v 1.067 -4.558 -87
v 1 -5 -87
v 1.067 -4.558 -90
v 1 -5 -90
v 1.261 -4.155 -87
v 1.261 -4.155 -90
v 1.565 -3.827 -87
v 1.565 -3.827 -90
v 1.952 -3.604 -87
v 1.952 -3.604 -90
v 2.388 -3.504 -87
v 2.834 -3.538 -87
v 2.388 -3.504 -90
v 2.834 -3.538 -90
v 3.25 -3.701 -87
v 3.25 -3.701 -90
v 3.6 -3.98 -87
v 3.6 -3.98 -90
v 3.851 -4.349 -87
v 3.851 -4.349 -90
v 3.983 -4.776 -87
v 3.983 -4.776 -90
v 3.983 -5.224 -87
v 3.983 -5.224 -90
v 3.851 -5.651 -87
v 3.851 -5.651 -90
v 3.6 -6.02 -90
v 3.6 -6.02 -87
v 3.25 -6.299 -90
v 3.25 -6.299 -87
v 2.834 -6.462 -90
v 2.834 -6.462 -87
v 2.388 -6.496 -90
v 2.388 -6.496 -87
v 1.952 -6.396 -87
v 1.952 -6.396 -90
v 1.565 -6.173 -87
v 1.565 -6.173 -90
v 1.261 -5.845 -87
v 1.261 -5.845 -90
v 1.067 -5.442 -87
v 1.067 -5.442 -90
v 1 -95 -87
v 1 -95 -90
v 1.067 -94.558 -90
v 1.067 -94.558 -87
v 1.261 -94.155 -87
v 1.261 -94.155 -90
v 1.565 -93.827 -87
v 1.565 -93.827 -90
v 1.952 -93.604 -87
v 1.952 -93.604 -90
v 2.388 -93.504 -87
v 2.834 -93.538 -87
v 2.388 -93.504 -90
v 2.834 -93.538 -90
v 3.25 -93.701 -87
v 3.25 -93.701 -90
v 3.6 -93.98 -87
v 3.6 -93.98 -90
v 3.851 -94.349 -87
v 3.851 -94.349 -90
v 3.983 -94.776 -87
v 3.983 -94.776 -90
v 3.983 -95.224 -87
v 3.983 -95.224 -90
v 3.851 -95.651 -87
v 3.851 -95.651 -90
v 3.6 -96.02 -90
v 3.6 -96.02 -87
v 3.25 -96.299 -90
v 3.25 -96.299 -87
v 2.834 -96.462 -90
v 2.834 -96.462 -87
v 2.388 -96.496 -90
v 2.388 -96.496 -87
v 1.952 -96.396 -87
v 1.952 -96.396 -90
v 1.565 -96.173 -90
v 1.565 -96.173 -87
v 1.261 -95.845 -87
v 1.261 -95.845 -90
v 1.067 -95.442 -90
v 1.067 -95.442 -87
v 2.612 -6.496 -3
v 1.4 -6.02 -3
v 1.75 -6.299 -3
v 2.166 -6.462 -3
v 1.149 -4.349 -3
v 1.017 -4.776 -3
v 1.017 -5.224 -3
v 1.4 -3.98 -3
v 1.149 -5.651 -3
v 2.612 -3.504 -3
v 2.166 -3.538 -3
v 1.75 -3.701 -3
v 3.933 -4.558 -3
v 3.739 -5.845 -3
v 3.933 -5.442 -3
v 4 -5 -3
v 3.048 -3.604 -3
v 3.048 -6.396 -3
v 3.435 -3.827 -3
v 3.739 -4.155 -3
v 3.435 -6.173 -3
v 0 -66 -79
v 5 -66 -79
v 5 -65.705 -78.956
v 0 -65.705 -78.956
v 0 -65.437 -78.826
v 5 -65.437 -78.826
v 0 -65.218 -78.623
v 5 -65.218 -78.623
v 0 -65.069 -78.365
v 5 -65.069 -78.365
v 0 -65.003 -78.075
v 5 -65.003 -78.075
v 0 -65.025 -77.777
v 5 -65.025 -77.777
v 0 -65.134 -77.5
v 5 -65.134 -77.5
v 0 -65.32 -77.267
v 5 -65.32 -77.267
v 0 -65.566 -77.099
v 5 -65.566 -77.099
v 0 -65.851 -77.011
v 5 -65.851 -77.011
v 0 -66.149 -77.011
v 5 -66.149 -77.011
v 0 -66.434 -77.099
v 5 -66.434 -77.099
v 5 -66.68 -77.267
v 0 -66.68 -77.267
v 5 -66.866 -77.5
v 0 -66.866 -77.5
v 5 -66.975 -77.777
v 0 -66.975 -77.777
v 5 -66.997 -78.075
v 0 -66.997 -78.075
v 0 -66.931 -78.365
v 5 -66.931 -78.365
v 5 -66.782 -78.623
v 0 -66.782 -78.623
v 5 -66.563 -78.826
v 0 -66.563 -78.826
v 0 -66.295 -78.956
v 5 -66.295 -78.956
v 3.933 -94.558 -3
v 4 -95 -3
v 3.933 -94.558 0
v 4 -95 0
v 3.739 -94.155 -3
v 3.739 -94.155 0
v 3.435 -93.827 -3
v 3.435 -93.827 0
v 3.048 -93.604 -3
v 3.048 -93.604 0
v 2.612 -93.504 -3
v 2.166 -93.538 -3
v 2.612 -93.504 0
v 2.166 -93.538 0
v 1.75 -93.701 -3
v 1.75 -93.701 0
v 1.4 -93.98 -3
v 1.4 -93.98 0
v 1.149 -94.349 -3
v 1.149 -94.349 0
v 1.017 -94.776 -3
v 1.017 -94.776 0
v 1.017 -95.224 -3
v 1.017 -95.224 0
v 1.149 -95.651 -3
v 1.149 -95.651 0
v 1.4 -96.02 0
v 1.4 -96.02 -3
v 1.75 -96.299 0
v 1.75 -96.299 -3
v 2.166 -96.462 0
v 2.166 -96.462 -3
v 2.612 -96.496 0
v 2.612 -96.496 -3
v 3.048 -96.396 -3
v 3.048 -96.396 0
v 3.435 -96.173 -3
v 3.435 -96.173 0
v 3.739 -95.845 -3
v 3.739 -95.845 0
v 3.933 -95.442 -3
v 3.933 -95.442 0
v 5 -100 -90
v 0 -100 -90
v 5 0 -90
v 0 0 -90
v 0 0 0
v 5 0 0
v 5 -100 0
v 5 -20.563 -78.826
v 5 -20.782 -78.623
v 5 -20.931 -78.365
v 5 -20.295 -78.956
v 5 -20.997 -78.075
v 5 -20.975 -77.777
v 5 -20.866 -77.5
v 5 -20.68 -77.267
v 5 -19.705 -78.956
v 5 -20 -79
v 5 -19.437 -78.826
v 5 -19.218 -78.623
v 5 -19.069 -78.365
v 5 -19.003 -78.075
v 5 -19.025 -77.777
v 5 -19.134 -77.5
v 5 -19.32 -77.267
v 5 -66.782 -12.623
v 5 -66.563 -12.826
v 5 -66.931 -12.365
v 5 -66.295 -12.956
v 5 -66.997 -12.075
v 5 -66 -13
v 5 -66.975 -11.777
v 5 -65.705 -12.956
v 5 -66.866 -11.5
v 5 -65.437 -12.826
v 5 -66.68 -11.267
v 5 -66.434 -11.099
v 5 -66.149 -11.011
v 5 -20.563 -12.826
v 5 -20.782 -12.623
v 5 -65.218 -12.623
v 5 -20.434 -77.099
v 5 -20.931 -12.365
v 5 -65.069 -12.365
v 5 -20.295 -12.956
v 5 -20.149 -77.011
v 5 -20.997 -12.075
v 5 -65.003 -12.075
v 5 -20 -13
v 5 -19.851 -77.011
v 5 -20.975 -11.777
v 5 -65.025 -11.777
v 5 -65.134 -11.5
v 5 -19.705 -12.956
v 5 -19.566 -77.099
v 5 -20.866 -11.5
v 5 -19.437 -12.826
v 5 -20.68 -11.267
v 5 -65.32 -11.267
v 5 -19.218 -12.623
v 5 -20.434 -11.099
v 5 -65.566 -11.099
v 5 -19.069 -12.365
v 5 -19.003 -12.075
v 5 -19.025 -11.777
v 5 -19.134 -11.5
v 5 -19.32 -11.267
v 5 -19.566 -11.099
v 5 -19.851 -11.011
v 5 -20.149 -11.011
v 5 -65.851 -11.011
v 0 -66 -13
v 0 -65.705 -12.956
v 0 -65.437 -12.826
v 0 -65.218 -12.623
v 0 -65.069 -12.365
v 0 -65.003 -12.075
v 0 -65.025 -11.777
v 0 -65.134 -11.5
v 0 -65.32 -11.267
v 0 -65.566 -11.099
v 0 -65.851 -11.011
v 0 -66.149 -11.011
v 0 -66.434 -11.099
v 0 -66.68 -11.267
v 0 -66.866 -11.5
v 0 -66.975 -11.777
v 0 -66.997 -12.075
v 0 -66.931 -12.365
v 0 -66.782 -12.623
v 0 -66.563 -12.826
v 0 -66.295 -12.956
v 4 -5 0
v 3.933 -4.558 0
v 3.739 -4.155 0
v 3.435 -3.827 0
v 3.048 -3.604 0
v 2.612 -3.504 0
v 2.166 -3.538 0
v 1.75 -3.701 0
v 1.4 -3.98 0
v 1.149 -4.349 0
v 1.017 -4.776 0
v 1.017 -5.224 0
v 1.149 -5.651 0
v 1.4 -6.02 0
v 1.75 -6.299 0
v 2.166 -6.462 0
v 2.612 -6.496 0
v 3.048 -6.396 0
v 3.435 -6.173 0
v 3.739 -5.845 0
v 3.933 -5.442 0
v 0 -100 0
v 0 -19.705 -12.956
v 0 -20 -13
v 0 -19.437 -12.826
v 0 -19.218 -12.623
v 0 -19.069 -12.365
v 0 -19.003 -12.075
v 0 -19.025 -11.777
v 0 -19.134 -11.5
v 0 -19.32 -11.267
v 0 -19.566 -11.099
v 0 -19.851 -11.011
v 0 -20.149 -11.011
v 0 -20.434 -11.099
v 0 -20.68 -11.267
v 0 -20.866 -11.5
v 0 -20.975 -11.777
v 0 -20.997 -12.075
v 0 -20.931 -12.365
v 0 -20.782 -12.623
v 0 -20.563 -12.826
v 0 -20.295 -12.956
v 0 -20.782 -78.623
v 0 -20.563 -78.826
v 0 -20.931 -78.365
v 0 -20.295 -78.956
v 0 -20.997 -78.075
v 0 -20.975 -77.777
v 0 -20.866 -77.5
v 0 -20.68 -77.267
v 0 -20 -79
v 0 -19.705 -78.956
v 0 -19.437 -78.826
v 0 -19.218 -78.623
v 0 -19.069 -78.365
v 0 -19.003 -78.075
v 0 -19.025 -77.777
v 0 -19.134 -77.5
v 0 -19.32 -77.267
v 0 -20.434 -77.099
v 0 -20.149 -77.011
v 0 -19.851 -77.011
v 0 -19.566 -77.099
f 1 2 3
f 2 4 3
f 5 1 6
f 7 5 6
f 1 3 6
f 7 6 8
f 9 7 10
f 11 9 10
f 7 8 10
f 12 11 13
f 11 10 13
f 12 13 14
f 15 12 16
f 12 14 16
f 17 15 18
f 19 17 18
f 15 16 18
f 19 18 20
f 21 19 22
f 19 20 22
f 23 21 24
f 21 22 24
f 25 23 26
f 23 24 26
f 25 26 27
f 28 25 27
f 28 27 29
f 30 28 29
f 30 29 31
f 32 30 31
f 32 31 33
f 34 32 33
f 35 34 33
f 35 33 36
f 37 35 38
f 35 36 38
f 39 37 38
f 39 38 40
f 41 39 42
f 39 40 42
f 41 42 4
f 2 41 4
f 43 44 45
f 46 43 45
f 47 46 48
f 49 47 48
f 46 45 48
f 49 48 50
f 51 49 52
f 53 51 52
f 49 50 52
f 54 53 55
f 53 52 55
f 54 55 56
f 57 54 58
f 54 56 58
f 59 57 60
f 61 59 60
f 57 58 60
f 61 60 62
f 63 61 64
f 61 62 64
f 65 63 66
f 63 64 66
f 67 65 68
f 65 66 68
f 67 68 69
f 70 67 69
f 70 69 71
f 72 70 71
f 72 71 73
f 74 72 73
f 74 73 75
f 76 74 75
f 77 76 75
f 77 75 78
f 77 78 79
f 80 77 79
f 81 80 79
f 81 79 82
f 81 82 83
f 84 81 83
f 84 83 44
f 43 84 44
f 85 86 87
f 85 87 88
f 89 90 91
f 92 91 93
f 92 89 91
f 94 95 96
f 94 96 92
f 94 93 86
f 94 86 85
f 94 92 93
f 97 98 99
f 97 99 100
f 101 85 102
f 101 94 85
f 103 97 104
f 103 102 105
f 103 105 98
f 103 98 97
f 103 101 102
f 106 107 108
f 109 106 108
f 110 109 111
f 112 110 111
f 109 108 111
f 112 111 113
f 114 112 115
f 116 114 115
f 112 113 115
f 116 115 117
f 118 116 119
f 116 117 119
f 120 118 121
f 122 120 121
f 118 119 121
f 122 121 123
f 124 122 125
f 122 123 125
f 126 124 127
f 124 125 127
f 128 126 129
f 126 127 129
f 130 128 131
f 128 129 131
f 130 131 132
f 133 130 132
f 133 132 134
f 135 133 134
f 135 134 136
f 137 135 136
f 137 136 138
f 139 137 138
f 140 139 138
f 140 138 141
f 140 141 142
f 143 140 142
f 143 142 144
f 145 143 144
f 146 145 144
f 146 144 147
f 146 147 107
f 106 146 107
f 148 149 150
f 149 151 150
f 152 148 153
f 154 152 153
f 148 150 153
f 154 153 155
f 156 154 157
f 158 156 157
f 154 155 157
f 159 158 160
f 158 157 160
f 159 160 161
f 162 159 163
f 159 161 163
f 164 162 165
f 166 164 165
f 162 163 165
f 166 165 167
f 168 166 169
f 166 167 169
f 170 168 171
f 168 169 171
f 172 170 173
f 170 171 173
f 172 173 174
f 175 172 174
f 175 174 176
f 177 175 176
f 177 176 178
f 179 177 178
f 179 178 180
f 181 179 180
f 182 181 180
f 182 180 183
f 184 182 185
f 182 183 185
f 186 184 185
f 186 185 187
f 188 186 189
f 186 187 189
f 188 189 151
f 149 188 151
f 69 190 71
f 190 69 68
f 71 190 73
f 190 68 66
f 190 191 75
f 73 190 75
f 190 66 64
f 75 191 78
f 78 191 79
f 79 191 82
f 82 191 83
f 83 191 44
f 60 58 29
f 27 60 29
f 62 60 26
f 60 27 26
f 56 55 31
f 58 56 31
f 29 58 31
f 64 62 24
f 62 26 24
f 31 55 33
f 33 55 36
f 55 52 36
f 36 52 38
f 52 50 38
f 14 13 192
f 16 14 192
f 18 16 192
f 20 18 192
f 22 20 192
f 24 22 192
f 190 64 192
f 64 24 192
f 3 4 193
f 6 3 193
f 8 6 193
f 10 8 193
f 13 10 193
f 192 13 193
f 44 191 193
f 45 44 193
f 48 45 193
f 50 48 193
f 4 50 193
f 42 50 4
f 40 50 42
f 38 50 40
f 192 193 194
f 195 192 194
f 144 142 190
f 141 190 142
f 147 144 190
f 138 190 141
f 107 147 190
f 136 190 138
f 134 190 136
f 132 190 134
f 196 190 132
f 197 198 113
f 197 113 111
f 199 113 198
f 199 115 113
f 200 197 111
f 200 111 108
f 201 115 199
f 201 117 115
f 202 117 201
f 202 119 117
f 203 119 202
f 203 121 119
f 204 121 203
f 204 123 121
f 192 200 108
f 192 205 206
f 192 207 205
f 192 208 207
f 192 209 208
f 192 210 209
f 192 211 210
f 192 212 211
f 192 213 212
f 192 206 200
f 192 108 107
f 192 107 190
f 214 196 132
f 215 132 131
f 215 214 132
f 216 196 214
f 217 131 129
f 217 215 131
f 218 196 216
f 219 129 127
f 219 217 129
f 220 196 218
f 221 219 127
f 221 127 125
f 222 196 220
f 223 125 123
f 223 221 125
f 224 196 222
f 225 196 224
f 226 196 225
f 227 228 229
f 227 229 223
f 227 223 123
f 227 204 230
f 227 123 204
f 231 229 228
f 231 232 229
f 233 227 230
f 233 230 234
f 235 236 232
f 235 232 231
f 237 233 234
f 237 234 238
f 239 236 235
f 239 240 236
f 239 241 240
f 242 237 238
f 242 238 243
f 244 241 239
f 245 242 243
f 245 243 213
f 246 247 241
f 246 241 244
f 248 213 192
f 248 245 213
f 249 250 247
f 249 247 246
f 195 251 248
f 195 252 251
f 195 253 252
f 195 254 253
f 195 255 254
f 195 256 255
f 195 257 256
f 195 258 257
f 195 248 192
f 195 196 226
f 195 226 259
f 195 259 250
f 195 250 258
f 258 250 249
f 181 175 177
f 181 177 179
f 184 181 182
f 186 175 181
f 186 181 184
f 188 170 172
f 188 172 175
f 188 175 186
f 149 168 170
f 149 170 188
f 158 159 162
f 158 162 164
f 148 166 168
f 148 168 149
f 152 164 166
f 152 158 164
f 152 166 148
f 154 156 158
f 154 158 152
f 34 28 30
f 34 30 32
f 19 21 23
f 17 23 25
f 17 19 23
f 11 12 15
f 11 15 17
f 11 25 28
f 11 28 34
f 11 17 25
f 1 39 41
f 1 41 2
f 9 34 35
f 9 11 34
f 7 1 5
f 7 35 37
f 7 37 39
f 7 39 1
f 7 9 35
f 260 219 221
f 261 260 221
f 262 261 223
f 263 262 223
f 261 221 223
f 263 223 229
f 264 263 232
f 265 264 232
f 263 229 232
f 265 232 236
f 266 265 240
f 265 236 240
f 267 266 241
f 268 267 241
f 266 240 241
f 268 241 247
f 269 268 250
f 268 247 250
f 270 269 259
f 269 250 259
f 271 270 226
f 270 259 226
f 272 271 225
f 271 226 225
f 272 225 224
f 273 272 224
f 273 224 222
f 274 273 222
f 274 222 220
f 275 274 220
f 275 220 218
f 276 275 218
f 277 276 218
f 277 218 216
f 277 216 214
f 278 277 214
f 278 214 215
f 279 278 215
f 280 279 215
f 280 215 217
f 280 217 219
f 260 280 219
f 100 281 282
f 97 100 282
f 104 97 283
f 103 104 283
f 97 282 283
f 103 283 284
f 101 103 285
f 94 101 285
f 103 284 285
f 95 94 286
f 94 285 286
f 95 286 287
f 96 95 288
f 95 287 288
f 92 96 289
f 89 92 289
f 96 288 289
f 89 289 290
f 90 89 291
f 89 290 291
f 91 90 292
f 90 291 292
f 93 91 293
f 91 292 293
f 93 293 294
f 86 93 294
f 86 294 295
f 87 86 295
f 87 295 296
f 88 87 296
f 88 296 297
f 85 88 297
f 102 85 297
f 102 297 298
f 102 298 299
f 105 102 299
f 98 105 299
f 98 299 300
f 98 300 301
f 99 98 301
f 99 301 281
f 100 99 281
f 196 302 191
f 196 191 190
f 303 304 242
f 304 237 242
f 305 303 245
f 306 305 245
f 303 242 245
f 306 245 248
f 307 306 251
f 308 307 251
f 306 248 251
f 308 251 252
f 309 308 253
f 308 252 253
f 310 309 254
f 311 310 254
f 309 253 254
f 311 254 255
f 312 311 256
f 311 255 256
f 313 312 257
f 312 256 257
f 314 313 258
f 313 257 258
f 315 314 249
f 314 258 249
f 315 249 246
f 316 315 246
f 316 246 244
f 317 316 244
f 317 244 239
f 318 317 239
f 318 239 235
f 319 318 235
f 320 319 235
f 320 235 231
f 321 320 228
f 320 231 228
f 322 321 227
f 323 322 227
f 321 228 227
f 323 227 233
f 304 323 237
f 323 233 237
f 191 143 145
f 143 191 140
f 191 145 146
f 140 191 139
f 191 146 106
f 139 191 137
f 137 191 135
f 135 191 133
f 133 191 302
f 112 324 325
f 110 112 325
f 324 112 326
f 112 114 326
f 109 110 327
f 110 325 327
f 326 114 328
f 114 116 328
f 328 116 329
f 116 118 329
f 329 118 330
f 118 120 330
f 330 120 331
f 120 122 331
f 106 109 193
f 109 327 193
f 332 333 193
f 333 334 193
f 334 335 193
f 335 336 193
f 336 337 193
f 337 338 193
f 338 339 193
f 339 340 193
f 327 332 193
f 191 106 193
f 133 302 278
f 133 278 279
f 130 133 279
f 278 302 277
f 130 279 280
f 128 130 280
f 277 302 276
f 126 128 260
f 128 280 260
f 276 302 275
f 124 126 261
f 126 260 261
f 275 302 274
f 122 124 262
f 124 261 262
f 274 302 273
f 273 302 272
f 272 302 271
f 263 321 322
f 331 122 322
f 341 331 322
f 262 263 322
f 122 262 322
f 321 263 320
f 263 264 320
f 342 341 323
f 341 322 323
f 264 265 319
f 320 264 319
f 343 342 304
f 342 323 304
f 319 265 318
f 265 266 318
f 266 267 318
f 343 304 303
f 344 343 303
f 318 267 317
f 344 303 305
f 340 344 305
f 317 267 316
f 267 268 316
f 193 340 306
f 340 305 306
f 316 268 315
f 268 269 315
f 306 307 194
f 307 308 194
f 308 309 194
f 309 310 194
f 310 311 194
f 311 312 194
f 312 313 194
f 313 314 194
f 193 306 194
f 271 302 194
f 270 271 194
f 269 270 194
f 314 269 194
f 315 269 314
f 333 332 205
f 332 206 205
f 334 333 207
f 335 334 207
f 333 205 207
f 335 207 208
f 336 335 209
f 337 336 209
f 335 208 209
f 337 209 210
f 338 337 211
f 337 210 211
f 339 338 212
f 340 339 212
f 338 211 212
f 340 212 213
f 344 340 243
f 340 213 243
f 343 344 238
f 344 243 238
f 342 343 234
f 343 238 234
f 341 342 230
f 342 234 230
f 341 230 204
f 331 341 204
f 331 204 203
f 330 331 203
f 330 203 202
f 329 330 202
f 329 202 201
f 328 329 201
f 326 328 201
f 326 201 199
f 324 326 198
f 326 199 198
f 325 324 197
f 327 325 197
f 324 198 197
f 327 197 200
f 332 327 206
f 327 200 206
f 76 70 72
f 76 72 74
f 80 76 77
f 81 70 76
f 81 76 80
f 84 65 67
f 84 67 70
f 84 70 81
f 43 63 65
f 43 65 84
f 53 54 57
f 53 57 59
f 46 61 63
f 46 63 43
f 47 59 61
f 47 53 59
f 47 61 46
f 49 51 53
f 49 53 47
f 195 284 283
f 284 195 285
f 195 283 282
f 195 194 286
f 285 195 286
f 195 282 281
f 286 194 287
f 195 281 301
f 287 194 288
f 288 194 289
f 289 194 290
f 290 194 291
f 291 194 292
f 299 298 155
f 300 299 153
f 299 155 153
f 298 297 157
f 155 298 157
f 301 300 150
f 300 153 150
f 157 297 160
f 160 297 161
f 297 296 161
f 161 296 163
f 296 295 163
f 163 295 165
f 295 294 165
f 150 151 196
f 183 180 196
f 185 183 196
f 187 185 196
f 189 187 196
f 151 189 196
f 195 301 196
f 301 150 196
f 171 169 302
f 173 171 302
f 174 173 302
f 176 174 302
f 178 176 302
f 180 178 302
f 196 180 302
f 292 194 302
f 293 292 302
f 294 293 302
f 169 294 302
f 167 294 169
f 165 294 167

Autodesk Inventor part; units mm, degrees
ref_plane "YZ Plane" through (0, 0, 0) normal (1, 0, 0) x (0, 1, 0)
ref_plane "XZ Plane" through (0, 0, 0) normal (0, 1, 0) x (-1, 0, 0)
ref_plane "XY Plane" through (0, 0, 0) normal (0, 0, 1) x (1, 0, 0)
sketch "Boceto1" plane through (0, 0, 0) normal (1, 0, 0) x (0, 1, 0)
  line L0 (0, 0) -> (-100, 0)
  line L1 (-100, 0) -> (-100, -90)
  line L2 (-100, -90) -> (0, -90)
  line L3 (0, -90) -> (0, 0)
  dimension "d0" = 90
  dimension "d1" = 100
extrude "Extrusión1" add sketch "Boceto1" along normal blind 5
sketch "Boceto2" plane through (0, -100, 0) normal (0, 0, 1) x (1, 0, 0)
  line L0 (20, -20) -> (0, 0)
  line L1 (20, -20) -> (20, -15)
  line L2 (20, -15) -> (5, 0)
  line L3 (0, 0) -> (0, 100) projected
  line L4 (0, 0) -> (5, 0)
  dimension "d6" = 5
extrude "Extrusión2" add sketch "Boceto2" against normal blind 90
sketch "Boceto3" plane through (5, 0, -90) normal (0, 0, -1) x (-1, 0, 0)
  circle A0 centre (2.5, -5) radius 1.5
  circle A1 centre (2.5, -95) radius 1.5
  line L0 (5, -100) -> (5, 0) projected
  line L1 (5, 0) -> (0, 0) projected
  line L2 (0, -100) -> (0, 0) projected
  dimension "d9" = 3
  dimension "d10" = 3
  dimension "d11" = 2.5
  dimension "d12" = 5
  dimension "d13" = 5
  dimension "d14" = 2.5
extrude "Extrusión3" cut sketch "Boceto3" against normal blind 3
sketch "Boceto4" plane through (0, 0, 0) normal (0, 0, 1) x (1, 0, 0)
  circle A0 centre (2.5, -5) radius 1.5 projected
  circle A1 centre (2.5, -5) radius 1.5
  circle A2 centre (2.5, -95) radius 1.5 projected
  circle A3 centre (2.5, -95) radius 1.5
  point P0 (0, 0)
extrude "Extrusión4" cut sketch "Boceto4" against normal blind 3
sketch "Boceto5" plane through (0, 0, 0) normal (0, 0, 1) x (1, 0, 0)
  line L0 (0, 0) -> (0, -100) projected
  line L1 (20, -115) -> (5, -100) projected
  line L2 (0, -100) -> (5, -100)
  line L3 (5, -100) -> (2.5, -102.5)
  line L4 (0, -100) -> (20, -120) projected
extrude "Extrusión5" cut sketch "Boceto5" against normal blind 3000
sketch "Boceto6" plane through (5, 0, 0) normal (1, 0, 0) x (0, 0, -1)
  point P0 (0, 0)
sketch "Boceto7" plane through (20, -120, 0) normal (0, 0, 1) x (1, 0, 0)
  line L0 (-17.5, 17.5) -> (0, 0) projected
  line L1 (0, 5) -> (-15, 20) projected
  line L2 (-17.5, 17.5) -> (-15, 20)
  line L3 (0, 0) -> (0, 5) projected
  line L4 (-15, 20) -> (0, 5)
  line L5 (0, 5) -> (0, 0)
  line L6 (0, 0) -> (-17.5, 17.5)
  point P0 (-20, 120)
extrude "Extrusión6" cut sketch "Boceto7" against normal blind 3000
sketch "Boceto8" plane through (5, 0, 0) normal (1, 0, 0) x (0, 0, -1)
  circle A0 centre (12, -20) radius 1
  line L0 (0, 0) -> (0, -100) projected
  line L1 (90, 0) -> (0, 0) projected
  circle A1 centre (78, -20) radius 1
  circle A2 centre (12, -66) radius 1
  circle A3 centre (78, -66) radius 1
  dimension "d23" = 2
  dimension "d24" = 12
  dimension "d25" = 20
  dimension "d26" = 2
  dimension "d27" = 66
  dimension "d28" = 20
  dimension "d29" = 2
  dimension "d30" = 2
  dimension "d31" = 46
  dimension "d32" = 46
  dimension "d33" = 66
extrude "Extrusión7" cut sketch "Boceto8" against normal blind 5
properties part number "Atras"
